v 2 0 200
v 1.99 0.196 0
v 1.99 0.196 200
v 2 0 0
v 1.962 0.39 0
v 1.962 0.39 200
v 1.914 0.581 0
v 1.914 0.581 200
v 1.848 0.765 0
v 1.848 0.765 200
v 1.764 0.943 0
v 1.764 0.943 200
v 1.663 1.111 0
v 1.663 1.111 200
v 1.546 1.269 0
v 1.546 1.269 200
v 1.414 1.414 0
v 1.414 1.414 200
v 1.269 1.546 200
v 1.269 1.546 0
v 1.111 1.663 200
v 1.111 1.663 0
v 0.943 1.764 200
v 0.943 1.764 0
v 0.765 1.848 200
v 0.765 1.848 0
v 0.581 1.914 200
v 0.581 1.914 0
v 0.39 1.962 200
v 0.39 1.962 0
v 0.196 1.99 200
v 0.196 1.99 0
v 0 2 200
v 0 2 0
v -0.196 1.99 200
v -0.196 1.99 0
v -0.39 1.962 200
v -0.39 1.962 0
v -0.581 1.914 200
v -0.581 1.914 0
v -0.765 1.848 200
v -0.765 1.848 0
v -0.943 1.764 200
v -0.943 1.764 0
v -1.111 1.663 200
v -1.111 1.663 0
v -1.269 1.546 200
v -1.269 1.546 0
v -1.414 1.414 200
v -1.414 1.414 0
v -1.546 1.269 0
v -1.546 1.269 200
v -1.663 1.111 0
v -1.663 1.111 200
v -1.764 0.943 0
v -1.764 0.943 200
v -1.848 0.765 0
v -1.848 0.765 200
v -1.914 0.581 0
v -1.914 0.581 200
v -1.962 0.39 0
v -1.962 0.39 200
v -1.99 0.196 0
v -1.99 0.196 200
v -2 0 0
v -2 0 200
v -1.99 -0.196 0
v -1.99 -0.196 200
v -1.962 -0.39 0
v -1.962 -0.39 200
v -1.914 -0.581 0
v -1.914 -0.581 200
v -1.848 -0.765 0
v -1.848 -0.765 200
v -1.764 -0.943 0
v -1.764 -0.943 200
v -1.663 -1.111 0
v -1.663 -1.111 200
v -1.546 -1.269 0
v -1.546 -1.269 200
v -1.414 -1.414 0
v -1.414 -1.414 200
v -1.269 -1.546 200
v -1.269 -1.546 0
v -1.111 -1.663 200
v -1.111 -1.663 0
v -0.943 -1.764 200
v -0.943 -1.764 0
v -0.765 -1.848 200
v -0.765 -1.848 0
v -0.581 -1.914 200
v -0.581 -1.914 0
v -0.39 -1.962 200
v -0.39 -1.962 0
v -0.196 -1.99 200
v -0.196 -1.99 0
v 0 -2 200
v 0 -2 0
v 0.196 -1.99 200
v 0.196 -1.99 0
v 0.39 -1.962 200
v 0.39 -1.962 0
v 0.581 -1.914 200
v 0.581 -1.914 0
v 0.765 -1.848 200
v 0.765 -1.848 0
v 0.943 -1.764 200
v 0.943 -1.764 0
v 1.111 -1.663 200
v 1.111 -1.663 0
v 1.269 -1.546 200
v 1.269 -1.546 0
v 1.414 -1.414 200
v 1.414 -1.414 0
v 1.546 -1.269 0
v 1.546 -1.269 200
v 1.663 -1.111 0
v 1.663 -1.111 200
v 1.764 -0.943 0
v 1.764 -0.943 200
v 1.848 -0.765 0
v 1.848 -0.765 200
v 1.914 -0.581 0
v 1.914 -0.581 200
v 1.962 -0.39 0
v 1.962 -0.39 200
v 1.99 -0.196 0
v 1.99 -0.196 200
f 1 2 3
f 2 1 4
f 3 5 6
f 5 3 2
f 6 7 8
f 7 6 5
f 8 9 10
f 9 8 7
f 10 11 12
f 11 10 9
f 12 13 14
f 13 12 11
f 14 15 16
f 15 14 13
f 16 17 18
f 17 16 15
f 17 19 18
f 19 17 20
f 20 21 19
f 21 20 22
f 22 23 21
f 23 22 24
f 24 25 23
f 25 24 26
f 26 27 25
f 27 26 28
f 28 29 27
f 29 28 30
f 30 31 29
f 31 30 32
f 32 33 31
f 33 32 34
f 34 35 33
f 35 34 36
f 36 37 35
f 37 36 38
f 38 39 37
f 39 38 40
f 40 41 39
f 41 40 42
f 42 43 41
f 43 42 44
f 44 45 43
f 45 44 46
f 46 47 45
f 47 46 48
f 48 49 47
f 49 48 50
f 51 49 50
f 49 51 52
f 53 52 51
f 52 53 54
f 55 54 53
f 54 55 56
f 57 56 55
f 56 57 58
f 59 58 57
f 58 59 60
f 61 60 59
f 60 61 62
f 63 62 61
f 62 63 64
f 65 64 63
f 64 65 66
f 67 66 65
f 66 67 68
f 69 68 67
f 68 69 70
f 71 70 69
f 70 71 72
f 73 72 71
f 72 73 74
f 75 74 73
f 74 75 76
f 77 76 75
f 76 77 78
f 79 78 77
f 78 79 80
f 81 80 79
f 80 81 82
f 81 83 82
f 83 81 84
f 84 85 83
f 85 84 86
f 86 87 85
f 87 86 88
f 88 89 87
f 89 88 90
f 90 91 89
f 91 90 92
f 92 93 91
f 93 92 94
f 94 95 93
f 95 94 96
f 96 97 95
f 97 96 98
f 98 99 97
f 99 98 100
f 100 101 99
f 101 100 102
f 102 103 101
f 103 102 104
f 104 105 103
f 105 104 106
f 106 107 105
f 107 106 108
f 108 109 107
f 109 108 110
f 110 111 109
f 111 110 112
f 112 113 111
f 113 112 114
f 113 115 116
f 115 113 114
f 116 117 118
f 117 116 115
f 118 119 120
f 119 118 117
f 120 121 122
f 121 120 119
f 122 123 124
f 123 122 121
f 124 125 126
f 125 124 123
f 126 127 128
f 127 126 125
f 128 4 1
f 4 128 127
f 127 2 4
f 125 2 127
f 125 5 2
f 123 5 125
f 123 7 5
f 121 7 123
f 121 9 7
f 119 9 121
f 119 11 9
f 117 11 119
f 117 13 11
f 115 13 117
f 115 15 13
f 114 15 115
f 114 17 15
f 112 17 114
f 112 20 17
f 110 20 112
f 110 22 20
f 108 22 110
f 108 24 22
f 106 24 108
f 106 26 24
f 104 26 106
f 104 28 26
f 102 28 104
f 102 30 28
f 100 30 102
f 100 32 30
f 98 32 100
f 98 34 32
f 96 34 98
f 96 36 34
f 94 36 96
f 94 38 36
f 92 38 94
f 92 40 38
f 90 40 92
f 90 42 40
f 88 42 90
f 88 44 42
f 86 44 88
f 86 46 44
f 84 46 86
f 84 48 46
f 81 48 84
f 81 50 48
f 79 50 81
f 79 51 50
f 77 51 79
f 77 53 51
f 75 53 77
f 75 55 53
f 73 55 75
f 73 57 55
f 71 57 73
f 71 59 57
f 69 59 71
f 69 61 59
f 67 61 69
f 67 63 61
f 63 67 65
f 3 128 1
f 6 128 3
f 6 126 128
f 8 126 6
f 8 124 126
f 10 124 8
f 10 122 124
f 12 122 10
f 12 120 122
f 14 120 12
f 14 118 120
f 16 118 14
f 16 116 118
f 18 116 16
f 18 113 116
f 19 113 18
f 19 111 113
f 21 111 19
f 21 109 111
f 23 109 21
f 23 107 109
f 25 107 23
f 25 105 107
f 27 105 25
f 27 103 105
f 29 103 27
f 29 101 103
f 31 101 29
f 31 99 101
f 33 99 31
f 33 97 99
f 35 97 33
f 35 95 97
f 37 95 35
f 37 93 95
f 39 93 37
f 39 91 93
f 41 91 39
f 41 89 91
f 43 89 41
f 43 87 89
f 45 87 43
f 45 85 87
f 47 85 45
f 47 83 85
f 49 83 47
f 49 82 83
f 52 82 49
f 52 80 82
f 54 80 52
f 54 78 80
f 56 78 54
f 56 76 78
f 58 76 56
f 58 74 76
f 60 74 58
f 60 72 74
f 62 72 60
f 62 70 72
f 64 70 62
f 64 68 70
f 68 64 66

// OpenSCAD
// Slender vertical post under axial compression. A long thin cylinder will
// buckle long before it yields in pure compression — this is the failure
// mode that the yield-stress check (`check_cantilever`) cannot see.
//
// Demonstrates: column_buckling BLOCK with margin << 1. The same geometry
// at the same load passes a back-of-envelope yield check (compressive
// stress = F/A ≈ 4 MPa, well below PLA yield 50 MPa); only Euler's
// formula catches the actual failure mode.
//
// part: post
// gravity: -z
// buckling: part=post axial_n=50 length_mm=200 section=round:4 material=PLA end_condition=fixed-free

post_diameter = 4;
post_height   = 200;

module post() {
    cylinder(h=post_height, d=post_diameter, $fn=64);
}

module assembly() {
    post();
}

assembly();
